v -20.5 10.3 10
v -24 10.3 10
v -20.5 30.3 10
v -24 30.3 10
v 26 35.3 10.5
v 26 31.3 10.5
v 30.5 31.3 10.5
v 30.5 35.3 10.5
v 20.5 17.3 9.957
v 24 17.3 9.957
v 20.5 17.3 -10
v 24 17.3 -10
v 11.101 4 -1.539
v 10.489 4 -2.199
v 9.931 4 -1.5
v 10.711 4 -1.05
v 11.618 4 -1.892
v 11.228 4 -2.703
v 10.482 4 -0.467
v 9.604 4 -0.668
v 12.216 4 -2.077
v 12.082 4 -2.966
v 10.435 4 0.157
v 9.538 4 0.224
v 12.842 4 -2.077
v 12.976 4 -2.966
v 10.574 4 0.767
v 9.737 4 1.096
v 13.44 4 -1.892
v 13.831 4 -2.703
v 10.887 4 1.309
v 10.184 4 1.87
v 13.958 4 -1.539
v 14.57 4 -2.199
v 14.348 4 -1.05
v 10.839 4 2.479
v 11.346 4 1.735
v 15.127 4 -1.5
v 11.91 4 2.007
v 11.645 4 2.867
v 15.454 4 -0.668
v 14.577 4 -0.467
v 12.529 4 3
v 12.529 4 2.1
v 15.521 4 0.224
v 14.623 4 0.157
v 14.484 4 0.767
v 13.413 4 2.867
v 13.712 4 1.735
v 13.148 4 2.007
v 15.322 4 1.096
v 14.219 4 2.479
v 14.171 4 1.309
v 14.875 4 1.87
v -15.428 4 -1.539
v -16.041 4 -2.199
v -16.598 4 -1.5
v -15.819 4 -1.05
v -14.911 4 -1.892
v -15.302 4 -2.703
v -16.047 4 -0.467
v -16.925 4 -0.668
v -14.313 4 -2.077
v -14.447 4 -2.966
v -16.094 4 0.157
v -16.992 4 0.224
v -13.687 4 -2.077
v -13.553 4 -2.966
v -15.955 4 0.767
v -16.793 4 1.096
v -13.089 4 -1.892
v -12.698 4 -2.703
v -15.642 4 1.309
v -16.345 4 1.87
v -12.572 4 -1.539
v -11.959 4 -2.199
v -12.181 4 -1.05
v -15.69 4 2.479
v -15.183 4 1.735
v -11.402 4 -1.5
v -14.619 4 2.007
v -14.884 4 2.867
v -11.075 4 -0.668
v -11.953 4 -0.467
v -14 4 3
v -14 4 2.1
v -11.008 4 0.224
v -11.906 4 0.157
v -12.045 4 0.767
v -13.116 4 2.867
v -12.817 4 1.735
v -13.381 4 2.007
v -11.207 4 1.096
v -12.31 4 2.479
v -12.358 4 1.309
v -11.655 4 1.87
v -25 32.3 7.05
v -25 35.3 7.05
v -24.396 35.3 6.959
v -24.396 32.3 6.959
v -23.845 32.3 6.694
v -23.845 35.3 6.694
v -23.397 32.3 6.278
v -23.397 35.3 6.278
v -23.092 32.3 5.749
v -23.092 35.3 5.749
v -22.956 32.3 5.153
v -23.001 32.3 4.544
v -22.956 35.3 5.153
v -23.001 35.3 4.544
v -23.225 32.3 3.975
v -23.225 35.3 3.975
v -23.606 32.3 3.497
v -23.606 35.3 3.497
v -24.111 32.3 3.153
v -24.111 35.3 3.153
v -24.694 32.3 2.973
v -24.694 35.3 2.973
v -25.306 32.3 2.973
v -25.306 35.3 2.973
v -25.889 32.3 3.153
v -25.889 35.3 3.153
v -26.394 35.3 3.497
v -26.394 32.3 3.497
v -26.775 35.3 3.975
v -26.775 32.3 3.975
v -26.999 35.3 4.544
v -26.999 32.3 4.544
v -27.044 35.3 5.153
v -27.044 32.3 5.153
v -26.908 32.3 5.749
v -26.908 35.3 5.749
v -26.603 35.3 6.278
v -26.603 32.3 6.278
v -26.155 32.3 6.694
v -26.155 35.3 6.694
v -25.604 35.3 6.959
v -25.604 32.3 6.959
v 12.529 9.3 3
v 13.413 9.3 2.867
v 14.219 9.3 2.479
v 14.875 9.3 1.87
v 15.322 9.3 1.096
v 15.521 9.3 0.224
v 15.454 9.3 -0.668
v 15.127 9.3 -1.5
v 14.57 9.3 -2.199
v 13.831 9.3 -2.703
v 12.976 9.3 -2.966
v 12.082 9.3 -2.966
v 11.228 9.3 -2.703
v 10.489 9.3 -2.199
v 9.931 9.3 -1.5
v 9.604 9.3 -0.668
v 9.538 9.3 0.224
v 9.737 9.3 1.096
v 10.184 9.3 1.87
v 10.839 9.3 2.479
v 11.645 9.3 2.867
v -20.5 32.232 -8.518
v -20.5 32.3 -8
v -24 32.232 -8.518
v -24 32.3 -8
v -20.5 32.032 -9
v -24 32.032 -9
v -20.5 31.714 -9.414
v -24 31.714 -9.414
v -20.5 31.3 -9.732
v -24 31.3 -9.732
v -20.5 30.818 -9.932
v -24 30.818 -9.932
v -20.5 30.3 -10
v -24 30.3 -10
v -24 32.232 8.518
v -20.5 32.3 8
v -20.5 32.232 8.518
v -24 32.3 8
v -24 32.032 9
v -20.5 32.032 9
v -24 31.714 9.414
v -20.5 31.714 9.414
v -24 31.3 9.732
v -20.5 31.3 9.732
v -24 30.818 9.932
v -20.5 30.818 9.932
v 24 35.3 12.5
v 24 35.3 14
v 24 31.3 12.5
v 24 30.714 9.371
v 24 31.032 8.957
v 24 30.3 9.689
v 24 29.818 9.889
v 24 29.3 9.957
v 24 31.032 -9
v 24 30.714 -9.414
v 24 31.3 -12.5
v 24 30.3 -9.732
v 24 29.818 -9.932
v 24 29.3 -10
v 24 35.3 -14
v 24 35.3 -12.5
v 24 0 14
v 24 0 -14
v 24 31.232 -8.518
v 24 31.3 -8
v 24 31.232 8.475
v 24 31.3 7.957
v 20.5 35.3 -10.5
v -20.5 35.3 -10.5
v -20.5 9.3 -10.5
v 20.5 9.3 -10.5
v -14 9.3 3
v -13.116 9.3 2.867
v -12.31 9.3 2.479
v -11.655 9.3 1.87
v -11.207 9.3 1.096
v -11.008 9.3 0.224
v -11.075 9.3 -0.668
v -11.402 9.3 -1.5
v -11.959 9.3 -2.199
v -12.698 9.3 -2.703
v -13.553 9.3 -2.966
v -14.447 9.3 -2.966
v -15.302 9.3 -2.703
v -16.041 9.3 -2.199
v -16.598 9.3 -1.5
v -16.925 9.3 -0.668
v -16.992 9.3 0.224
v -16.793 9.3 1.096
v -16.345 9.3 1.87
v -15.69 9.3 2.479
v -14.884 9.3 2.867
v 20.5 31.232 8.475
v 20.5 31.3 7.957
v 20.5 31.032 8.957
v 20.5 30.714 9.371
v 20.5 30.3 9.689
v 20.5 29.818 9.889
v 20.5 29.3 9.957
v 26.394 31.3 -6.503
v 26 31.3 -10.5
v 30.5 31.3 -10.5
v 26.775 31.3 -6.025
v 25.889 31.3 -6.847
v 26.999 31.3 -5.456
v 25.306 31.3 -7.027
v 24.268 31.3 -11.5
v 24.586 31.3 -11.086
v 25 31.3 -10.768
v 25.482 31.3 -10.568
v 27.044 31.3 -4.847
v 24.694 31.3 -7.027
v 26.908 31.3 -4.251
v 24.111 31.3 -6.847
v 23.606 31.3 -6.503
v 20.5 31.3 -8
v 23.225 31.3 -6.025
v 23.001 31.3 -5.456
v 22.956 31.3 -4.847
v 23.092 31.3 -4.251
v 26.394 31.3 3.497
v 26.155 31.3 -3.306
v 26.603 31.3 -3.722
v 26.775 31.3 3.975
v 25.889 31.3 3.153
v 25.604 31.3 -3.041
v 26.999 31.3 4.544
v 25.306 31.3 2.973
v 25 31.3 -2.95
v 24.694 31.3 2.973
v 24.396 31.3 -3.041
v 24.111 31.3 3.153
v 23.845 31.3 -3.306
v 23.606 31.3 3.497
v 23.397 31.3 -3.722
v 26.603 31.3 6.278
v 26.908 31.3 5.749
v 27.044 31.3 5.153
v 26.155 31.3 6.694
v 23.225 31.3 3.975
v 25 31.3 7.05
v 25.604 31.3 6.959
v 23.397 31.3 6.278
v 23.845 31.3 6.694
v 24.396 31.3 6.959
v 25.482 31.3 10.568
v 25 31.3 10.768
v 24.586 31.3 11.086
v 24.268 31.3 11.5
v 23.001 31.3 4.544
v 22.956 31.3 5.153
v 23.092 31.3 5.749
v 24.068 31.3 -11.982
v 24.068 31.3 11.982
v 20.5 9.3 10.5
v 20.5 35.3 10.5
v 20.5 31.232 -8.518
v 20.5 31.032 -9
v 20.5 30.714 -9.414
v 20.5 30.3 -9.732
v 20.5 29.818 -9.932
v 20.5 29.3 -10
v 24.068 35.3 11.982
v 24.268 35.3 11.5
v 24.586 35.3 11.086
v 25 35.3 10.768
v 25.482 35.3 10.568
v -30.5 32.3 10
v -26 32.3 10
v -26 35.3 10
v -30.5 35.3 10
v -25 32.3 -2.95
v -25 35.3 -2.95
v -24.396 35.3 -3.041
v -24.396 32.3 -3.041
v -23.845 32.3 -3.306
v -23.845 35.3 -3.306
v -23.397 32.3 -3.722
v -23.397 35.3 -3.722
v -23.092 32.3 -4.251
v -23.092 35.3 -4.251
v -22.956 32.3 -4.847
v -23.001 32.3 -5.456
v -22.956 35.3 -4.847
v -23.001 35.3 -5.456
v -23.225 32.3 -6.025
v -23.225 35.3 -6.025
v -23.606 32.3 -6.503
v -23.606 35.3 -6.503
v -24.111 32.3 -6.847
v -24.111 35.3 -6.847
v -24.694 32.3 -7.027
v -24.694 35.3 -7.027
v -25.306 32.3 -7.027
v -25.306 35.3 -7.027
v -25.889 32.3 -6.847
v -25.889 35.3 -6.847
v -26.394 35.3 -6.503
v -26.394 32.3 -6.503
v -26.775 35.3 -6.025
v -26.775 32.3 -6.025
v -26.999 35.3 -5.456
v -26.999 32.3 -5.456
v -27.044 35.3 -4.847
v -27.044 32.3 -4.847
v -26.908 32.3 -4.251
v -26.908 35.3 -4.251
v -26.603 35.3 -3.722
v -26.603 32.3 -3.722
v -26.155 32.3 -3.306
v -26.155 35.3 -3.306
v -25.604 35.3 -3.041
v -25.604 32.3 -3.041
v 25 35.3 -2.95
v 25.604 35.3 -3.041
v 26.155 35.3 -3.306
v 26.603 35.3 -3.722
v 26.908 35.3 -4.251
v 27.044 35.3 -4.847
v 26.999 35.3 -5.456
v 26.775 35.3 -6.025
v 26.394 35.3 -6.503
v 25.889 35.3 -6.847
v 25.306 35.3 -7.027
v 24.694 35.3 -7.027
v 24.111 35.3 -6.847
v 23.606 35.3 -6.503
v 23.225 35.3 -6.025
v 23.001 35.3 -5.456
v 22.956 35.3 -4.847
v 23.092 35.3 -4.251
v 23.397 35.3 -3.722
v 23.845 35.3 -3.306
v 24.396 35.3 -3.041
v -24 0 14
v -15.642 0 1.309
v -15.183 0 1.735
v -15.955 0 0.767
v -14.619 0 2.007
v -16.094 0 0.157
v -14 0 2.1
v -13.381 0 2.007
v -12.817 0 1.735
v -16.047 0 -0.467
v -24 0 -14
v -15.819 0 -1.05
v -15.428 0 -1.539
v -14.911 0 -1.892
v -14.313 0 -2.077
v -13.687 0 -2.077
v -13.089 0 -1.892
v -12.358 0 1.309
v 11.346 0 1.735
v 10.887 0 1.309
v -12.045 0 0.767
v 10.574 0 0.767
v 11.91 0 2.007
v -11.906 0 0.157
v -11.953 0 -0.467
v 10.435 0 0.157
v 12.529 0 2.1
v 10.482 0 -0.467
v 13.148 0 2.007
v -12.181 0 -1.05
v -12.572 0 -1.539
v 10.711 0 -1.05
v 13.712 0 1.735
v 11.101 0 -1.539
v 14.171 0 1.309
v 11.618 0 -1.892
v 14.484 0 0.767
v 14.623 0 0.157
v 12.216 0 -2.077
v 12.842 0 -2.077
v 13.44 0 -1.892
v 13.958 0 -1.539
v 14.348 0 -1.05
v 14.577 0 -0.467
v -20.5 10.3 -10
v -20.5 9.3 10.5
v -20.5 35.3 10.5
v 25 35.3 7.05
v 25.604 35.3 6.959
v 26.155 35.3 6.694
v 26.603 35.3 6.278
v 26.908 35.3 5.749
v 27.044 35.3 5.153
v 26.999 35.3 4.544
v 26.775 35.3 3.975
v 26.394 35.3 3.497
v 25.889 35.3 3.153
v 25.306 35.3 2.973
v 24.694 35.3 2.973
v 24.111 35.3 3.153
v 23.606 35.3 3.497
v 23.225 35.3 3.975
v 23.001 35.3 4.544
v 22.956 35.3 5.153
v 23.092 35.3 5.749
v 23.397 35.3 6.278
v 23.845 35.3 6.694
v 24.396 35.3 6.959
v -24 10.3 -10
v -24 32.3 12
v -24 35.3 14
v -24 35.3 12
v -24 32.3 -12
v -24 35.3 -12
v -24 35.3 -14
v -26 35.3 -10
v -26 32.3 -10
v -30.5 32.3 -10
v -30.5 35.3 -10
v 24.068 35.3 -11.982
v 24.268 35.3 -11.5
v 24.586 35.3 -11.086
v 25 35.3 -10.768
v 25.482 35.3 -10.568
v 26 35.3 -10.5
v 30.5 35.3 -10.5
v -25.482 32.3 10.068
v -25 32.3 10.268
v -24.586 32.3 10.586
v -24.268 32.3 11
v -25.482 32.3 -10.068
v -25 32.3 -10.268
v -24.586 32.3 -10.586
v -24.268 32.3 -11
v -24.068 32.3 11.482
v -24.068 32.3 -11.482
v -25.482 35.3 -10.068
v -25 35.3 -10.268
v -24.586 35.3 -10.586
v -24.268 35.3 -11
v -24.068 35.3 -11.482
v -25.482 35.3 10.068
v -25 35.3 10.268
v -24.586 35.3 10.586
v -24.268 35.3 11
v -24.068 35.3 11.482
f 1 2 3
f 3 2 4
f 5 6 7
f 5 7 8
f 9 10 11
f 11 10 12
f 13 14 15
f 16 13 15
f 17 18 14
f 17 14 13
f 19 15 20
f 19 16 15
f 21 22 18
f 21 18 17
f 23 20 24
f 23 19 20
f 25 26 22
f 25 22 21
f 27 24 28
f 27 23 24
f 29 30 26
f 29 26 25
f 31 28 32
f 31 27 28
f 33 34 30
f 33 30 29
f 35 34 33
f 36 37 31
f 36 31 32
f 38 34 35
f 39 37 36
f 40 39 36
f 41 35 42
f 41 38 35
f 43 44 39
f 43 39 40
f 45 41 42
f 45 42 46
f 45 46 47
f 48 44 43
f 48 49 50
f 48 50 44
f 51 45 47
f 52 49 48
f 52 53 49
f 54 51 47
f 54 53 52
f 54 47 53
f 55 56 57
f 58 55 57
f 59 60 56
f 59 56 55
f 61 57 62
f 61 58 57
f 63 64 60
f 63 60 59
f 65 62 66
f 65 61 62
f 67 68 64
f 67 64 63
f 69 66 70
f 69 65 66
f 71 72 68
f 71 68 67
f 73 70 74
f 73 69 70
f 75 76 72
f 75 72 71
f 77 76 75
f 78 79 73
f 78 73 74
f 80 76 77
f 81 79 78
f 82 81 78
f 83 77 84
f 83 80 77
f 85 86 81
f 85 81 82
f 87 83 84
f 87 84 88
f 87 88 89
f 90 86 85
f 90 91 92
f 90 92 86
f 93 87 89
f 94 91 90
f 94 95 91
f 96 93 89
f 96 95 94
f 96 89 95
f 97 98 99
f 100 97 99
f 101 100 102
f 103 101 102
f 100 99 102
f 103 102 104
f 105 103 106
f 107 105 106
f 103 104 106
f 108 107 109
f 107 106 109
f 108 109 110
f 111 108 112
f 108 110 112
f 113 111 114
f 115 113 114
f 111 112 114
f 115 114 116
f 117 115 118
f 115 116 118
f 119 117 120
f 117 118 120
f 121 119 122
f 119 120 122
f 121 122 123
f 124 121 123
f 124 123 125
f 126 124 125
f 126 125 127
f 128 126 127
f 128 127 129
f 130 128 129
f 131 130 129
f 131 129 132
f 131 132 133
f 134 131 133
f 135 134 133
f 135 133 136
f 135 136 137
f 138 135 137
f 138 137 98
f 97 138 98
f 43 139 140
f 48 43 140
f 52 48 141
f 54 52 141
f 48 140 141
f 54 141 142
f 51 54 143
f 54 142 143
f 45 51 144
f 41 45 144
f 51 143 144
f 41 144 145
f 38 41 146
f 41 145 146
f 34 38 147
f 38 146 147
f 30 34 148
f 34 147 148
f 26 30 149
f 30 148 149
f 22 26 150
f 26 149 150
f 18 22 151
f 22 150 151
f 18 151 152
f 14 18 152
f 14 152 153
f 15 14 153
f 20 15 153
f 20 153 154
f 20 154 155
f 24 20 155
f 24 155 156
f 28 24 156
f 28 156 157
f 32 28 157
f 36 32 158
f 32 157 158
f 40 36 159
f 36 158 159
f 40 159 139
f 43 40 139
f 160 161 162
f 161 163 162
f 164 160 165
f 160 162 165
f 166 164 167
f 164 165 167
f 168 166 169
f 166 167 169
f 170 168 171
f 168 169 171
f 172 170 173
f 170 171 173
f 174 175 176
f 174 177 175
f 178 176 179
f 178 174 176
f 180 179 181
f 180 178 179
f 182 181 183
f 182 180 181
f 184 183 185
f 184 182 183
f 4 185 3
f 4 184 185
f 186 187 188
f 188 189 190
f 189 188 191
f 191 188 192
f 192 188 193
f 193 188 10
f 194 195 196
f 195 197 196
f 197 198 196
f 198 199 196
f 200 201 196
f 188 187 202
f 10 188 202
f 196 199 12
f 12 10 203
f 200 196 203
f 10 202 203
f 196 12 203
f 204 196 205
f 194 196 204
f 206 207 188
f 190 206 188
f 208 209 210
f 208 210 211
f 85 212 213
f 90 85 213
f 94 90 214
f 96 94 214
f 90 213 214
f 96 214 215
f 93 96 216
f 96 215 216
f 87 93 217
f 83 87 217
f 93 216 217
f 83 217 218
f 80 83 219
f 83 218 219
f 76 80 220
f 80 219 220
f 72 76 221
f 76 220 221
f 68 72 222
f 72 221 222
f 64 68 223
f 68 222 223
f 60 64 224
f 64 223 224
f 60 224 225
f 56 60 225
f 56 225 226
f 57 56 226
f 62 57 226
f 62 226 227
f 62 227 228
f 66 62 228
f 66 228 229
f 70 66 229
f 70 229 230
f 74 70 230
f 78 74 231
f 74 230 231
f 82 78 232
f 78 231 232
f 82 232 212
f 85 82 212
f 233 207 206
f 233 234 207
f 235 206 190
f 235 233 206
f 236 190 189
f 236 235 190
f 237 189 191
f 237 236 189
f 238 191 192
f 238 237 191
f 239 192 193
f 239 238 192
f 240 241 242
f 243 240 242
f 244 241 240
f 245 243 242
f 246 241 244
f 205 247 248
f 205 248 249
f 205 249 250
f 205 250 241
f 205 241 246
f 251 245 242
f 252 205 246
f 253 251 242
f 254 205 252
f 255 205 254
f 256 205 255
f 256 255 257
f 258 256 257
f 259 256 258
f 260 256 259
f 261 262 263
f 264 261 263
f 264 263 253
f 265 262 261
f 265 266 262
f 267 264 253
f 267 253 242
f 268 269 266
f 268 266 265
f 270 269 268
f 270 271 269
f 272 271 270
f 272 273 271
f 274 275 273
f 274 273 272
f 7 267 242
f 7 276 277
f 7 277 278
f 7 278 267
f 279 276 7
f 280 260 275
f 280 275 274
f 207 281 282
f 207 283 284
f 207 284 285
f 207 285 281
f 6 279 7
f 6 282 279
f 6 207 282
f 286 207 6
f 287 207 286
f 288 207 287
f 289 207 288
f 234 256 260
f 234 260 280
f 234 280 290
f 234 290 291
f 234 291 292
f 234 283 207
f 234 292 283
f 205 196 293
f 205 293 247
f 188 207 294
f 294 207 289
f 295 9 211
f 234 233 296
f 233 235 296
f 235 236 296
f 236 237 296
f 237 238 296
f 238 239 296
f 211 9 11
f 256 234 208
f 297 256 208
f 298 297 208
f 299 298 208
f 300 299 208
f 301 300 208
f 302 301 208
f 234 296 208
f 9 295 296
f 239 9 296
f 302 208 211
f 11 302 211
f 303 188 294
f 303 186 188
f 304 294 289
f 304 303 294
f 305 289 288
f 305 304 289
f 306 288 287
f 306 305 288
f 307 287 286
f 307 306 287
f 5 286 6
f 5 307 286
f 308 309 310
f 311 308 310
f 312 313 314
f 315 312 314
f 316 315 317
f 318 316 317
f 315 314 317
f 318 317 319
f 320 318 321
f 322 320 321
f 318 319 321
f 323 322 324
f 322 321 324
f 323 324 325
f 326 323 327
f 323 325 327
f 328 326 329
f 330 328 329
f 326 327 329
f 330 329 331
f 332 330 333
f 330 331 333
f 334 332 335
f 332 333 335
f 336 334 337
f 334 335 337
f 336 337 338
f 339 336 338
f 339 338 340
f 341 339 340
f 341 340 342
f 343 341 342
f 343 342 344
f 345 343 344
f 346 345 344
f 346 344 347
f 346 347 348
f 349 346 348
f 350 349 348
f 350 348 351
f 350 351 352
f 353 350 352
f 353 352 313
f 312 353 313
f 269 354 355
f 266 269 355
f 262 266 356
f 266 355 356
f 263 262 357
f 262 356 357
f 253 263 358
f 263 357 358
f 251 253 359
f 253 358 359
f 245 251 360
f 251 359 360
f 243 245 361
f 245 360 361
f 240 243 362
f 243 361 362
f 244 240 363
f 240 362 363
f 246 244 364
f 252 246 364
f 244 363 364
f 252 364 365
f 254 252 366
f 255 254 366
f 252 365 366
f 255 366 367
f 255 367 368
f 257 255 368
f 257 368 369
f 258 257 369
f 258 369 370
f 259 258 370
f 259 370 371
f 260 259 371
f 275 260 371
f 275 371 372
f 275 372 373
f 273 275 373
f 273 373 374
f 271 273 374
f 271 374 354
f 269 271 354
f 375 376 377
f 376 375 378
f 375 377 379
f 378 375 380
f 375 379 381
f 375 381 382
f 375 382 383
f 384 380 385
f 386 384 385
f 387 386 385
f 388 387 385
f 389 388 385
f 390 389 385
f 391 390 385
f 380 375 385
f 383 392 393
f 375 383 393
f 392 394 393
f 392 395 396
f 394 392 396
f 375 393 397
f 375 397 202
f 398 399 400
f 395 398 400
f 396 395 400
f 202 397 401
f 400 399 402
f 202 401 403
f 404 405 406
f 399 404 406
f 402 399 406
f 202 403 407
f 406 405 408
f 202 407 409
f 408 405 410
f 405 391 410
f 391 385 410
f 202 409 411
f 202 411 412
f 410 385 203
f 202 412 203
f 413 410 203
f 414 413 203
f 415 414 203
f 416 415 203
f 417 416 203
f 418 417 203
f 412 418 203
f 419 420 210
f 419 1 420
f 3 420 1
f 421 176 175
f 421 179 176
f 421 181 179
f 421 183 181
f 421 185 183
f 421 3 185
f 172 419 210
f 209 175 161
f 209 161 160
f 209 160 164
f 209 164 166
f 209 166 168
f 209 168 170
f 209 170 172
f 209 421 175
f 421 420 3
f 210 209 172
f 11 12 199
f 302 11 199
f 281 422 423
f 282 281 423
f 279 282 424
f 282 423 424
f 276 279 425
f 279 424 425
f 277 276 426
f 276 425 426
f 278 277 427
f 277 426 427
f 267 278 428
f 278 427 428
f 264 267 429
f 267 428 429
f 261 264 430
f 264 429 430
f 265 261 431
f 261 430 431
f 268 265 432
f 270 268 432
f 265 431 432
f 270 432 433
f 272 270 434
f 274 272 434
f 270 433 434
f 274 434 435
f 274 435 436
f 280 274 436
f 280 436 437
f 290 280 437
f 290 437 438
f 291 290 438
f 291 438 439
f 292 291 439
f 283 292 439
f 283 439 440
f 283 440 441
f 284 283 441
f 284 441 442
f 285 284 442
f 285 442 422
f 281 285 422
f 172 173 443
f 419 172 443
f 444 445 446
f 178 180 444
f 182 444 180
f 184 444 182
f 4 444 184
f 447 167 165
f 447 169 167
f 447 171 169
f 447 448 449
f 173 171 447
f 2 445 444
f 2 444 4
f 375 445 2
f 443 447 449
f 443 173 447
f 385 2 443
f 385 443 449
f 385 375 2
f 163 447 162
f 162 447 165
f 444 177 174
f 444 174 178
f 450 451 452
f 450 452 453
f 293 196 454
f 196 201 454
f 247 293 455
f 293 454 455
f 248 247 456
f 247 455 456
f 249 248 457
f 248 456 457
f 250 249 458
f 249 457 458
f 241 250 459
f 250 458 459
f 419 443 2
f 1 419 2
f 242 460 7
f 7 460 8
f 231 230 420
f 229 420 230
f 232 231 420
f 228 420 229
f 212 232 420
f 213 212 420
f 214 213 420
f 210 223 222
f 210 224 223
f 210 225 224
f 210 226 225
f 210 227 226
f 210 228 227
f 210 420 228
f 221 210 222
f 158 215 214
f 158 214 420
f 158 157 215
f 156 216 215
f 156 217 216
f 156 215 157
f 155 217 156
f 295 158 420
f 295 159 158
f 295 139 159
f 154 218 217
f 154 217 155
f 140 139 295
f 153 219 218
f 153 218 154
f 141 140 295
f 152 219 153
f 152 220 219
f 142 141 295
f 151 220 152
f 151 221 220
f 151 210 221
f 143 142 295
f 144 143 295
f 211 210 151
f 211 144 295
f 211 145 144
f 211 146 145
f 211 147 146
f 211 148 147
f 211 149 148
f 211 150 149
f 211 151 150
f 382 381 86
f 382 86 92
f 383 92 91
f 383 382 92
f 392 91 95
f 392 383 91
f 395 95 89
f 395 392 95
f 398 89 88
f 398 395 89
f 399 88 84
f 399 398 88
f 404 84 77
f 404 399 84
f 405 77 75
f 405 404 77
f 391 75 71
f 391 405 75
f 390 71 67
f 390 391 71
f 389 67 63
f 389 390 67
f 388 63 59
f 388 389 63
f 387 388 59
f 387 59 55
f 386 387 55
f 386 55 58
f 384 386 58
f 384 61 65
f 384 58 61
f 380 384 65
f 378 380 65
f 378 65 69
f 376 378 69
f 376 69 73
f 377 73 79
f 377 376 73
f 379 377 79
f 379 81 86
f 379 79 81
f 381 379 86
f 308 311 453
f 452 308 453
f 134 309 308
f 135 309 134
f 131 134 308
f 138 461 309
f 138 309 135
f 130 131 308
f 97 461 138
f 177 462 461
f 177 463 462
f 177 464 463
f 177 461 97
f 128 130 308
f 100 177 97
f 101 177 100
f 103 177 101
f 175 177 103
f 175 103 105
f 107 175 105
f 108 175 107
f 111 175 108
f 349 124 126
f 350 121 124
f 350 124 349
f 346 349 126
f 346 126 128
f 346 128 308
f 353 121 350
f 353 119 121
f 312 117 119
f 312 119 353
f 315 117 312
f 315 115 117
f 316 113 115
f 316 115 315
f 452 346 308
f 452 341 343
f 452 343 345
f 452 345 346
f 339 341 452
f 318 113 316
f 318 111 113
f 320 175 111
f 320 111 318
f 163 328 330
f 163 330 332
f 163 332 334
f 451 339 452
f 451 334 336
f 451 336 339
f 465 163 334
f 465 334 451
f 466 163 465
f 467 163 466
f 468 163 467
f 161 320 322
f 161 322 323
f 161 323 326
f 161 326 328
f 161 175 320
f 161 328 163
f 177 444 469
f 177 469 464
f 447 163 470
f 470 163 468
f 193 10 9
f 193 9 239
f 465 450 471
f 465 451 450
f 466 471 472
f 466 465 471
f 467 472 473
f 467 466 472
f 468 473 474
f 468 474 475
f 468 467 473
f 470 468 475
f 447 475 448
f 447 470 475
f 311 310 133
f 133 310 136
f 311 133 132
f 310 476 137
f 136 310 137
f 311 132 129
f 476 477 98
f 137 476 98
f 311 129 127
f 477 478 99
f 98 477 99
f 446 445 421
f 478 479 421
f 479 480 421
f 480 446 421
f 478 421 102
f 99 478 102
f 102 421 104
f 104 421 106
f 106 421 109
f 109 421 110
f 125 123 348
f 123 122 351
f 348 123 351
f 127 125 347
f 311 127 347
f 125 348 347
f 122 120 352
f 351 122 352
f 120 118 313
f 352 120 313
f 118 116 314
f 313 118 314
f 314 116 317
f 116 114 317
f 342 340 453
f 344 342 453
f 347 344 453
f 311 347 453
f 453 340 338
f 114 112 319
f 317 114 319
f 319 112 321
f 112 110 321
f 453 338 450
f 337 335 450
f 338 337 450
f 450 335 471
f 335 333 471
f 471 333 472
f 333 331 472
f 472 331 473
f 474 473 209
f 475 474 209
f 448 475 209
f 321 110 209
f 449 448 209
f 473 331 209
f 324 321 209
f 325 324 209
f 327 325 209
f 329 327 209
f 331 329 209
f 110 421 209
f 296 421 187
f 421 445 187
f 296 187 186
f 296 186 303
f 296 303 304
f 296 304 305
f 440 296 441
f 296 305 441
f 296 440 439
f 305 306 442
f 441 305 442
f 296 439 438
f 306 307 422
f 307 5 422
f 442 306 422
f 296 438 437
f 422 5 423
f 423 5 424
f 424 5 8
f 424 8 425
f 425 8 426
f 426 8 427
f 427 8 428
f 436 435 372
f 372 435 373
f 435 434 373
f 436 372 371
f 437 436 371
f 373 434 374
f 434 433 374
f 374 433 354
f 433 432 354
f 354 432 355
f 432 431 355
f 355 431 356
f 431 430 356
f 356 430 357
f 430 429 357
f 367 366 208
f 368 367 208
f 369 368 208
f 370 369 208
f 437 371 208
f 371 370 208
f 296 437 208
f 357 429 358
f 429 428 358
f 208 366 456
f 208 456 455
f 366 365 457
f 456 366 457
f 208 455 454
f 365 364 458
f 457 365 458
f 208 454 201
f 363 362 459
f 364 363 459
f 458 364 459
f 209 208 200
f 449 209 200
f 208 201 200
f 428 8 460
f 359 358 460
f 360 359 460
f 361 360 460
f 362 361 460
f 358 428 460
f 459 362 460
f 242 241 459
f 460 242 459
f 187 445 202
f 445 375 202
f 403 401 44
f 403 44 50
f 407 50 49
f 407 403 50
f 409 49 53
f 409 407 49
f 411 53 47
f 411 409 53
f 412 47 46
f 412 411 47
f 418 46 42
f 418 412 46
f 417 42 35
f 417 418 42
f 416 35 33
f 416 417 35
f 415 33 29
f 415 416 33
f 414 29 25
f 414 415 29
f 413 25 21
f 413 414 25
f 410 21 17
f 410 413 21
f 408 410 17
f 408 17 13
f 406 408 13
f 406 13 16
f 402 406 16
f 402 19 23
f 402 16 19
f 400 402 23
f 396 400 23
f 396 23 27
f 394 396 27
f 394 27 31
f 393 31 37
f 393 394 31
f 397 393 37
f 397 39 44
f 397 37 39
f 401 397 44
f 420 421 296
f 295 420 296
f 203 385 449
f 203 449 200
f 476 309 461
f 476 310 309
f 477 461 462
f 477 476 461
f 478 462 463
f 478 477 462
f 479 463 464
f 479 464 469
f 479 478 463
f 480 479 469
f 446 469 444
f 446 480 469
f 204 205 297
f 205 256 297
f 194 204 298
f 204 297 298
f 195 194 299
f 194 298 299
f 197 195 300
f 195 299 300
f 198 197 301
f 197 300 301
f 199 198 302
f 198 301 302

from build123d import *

# Parameters (mm, degrees)
SKETCH_1_W               = 48
SKETCH_1_H               = 28
EXTRUDE_1_DEPTH          = 9.3
SKETCH_2_W               = 48
SKETCH_2_H               = 28
SKETCH_2_W_2             = 40
SKETCH_2_H_2             = 20
EXTRUDE_2_DEPTH          = 26
SKETCH_3_W               = 41
SKETCH_3_H               = 21
CUT_EXTRUDE_1_DEPTH      = 26
SKETCH_4_W               = 19.956885432
SKETCH_4_H               = 18
CUT_EXTRUDE_2_DEPTH      = 10
CUT_EXTRUDE_3_DEPTH      = 6
SKETCH_7_W               = 20
SKETCH_7_H               = 3
EXTRUDE_4_DEPTH          = 10
FILLET_3_R               = 2
SKETCH_9_W               = 21
SKETCH_9_H               = 4
EXTRUDE_5_DEPTH          = 10
SKETCH_10_R              = 2.05
CUT_EXTRUDE_5_DEPTH      = 10
FILLET_4_R               = 2
SKETCH_11_R              = 3
CUT_EXTRUDE_6_DEPTH      = 5.3
CUT_EXTRUDE_7_DEPTH      = 46.890521897
CUT_EXTRUDE_7_DEPTH_BACK = 46.890521897
SKETCH_12_R              = 2.1
FILLET_5_R               = 2


with BuildPart() as part:
    # 草图1 → 凸台-拉伸1 (new body)
    with BuildSketch(Plane(origin=(0, 0, 0), x_dir=(1, 0, 0), z_dir=(0, 1, 0))):
        Rectangle(SKETCH_1_W, SKETCH_1_H)
    extrude(amount=EXTRUDE_1_DEPTH)

    # 草图2 → 凸台-拉伸2 (add)
    with BuildSketch(Plane(origin=(0, 9.3, 0), x_dir=(1, 0, 0), z_dir=(0, 1, 0))):
        Rectangle(SKETCH_2_W, SKETCH_2_H)
        Rectangle(SKETCH_2_W_2, SKETCH_2_H_2, mode=Mode.SUBTRACT)
    extrude(amount=EXTRUDE_2_DEPTH)

    # 草图3 → 切除-拉伸1 (cut)
    with BuildSketch(Plane(origin=(0, 35.3, 0), x_dir=(1, 0, 0), z_dir=(0, 1, 0))):
        Rectangle(SKETCH_3_W, SKETCH_3_H)
    extrude(amount=-CUT_EXTRUDE_1_DEPTH, mode=Mode.SUBTRACT)

    # 草图4 → 切除-拉伸2 (cut)
    with BuildSketch(Plane(origin=(24, 0, 0), x_dir=(0, 0, -1), z_dir=(1, 0, 0))):
        with Locations((0.021557284, 26.3)):
            Rectangle(SKETCH_4_W, SKETCH_4_H)
    extrude(amount=-CUT_EXTRUDE_2_DEPTH, mode=Mode.SUBTRACT)

    # 草图6 → 切除-拉伸3 (cut)
    with BuildSketch(Plane.ZY.offset(24)):
        Polygon((0, 35.3), (-10, 35.3), (-10, 10.3), (10, 10.3), (10, 35.3), align=None)
    extrude(amount=-CUT_EXTRUDE_3_DEPTH, mode=Mode.SUBTRACT)

    # 草图7 → 凸台-拉伸4 (add)
    with BuildSketch(Plane(origin=(-20.5, 0, 0), x_dir=(0, 0, -1), z_dir=(1, 0, 0))):
        with Locations((0, 33.8)):
            Rectangle(SKETCH_7_W, SKETCH_7_H)
    extrude(amount=-EXTRUDE_4_DEPTH)

    # 圆角3
    fillet_3_edges = [part.edges().sort_by_distance(p)[0] for p in [
        (-24, 33.8, 10),
        (-24, 33.8, -10),
    ]]
    fillet(fillet_3_edges, radius=FILLET_3_R)

    # 草图9 → 凸台-拉伸5 (add)
    with BuildSketch(Plane.ZY.offset(-20.5)):
        with Locations((0, 33.3)):
            Rectangle(SKETCH_9_W, SKETCH_9_H)
    extrude(amount=-EXTRUDE_5_DEPTH)

    # 草图10 → 切除-拉伸5 (cut)
    with BuildSketch(Plane(origin=(0, 35.3, 0), x_dir=(1, 0, 0), z_dir=(0, 1, 0))):
        with Locations(Location((25, 5, 0), (0, 0, 270))):
            Circle(SKETCH_10_R)
        with Locations(Location((25, -5, 0), (0, 0, 270))):
            Circle(SKETCH_10_R)
        with Locations(Location((-25, 5, 0), (0, 0, 270))):
            Circle(SKETCH_10_R)
        with Locations(Location((-25, -5, 0), (0, 0, 270))):
            Circle(SKETCH_10_R)
    extrude(amount=-CUT_EXTRUDE_5_DEPTH, mode=Mode.SUBTRACT)

    # 圆角4
    fillet_4_edges = [part.edges().sort_by_distance(p)[0] for p in [
        (24, 33.3, -10.5),
        (24, 33.3, 10.5),
    ]]
    fillet(fillet_4_edges, radius=FILLET_4_R)

    # 草图11 → 切除-拉伸6 (cut)
    with BuildSketch(Plane(origin=(0, 9.3, 0), x_dir=(1, 0, 0), z_dir=(0, 1, 0))):
        with Locations(Location((-14, 0, 0), (0, 0, 270))):
            Circle(SKETCH_11_R)
        with Locations(Location((12.529194913, 0, 0), (0, 0, 270))):
            Circle(SKETCH_11_R)
    extrude(amount=-CUT_EXTRUDE_6_DEPTH, mode=Mode.SUBTRACT)

    # 草图12 → 切除-拉伸7 (cut, two sides: drawn at the far end of the back side and taken through both)
    with BuildSketch(Plane(origin=(0, 4, 0), x_dir=(1, 0, 0), z_dir=(0, 1, 0)).offset(-CUT_EXTRUDE_7_DEPTH_BACK)):
        with Locations(Location((-14, 0, 0), (0, 0, 270))):
            Circle(SKETCH_12_R)
        with Locations(Location((12.529194913, 0, 0), (0, 0, 270))):
            Circle(SKETCH_12_R)
    extrude(amount=CUT_EXTRUDE_7_DEPTH + CUT_EXTRUDE_7_DEPTH_BACK, mode=Mode.SUBTRACT)

    # 圆角5
    fillet_5_edges = [part.edges().sort_by_distance(p)[0] for p in [
        (-22.25, 32.3, -10),
        (-22.25, 32.3, 10),
        (22.25, 31.3, 9.956885432),
        (22.25, 31.3, -10),
    ]]
    fillet(fillet_5_edges, radius=FILLET_5_R)


solid = part.part
